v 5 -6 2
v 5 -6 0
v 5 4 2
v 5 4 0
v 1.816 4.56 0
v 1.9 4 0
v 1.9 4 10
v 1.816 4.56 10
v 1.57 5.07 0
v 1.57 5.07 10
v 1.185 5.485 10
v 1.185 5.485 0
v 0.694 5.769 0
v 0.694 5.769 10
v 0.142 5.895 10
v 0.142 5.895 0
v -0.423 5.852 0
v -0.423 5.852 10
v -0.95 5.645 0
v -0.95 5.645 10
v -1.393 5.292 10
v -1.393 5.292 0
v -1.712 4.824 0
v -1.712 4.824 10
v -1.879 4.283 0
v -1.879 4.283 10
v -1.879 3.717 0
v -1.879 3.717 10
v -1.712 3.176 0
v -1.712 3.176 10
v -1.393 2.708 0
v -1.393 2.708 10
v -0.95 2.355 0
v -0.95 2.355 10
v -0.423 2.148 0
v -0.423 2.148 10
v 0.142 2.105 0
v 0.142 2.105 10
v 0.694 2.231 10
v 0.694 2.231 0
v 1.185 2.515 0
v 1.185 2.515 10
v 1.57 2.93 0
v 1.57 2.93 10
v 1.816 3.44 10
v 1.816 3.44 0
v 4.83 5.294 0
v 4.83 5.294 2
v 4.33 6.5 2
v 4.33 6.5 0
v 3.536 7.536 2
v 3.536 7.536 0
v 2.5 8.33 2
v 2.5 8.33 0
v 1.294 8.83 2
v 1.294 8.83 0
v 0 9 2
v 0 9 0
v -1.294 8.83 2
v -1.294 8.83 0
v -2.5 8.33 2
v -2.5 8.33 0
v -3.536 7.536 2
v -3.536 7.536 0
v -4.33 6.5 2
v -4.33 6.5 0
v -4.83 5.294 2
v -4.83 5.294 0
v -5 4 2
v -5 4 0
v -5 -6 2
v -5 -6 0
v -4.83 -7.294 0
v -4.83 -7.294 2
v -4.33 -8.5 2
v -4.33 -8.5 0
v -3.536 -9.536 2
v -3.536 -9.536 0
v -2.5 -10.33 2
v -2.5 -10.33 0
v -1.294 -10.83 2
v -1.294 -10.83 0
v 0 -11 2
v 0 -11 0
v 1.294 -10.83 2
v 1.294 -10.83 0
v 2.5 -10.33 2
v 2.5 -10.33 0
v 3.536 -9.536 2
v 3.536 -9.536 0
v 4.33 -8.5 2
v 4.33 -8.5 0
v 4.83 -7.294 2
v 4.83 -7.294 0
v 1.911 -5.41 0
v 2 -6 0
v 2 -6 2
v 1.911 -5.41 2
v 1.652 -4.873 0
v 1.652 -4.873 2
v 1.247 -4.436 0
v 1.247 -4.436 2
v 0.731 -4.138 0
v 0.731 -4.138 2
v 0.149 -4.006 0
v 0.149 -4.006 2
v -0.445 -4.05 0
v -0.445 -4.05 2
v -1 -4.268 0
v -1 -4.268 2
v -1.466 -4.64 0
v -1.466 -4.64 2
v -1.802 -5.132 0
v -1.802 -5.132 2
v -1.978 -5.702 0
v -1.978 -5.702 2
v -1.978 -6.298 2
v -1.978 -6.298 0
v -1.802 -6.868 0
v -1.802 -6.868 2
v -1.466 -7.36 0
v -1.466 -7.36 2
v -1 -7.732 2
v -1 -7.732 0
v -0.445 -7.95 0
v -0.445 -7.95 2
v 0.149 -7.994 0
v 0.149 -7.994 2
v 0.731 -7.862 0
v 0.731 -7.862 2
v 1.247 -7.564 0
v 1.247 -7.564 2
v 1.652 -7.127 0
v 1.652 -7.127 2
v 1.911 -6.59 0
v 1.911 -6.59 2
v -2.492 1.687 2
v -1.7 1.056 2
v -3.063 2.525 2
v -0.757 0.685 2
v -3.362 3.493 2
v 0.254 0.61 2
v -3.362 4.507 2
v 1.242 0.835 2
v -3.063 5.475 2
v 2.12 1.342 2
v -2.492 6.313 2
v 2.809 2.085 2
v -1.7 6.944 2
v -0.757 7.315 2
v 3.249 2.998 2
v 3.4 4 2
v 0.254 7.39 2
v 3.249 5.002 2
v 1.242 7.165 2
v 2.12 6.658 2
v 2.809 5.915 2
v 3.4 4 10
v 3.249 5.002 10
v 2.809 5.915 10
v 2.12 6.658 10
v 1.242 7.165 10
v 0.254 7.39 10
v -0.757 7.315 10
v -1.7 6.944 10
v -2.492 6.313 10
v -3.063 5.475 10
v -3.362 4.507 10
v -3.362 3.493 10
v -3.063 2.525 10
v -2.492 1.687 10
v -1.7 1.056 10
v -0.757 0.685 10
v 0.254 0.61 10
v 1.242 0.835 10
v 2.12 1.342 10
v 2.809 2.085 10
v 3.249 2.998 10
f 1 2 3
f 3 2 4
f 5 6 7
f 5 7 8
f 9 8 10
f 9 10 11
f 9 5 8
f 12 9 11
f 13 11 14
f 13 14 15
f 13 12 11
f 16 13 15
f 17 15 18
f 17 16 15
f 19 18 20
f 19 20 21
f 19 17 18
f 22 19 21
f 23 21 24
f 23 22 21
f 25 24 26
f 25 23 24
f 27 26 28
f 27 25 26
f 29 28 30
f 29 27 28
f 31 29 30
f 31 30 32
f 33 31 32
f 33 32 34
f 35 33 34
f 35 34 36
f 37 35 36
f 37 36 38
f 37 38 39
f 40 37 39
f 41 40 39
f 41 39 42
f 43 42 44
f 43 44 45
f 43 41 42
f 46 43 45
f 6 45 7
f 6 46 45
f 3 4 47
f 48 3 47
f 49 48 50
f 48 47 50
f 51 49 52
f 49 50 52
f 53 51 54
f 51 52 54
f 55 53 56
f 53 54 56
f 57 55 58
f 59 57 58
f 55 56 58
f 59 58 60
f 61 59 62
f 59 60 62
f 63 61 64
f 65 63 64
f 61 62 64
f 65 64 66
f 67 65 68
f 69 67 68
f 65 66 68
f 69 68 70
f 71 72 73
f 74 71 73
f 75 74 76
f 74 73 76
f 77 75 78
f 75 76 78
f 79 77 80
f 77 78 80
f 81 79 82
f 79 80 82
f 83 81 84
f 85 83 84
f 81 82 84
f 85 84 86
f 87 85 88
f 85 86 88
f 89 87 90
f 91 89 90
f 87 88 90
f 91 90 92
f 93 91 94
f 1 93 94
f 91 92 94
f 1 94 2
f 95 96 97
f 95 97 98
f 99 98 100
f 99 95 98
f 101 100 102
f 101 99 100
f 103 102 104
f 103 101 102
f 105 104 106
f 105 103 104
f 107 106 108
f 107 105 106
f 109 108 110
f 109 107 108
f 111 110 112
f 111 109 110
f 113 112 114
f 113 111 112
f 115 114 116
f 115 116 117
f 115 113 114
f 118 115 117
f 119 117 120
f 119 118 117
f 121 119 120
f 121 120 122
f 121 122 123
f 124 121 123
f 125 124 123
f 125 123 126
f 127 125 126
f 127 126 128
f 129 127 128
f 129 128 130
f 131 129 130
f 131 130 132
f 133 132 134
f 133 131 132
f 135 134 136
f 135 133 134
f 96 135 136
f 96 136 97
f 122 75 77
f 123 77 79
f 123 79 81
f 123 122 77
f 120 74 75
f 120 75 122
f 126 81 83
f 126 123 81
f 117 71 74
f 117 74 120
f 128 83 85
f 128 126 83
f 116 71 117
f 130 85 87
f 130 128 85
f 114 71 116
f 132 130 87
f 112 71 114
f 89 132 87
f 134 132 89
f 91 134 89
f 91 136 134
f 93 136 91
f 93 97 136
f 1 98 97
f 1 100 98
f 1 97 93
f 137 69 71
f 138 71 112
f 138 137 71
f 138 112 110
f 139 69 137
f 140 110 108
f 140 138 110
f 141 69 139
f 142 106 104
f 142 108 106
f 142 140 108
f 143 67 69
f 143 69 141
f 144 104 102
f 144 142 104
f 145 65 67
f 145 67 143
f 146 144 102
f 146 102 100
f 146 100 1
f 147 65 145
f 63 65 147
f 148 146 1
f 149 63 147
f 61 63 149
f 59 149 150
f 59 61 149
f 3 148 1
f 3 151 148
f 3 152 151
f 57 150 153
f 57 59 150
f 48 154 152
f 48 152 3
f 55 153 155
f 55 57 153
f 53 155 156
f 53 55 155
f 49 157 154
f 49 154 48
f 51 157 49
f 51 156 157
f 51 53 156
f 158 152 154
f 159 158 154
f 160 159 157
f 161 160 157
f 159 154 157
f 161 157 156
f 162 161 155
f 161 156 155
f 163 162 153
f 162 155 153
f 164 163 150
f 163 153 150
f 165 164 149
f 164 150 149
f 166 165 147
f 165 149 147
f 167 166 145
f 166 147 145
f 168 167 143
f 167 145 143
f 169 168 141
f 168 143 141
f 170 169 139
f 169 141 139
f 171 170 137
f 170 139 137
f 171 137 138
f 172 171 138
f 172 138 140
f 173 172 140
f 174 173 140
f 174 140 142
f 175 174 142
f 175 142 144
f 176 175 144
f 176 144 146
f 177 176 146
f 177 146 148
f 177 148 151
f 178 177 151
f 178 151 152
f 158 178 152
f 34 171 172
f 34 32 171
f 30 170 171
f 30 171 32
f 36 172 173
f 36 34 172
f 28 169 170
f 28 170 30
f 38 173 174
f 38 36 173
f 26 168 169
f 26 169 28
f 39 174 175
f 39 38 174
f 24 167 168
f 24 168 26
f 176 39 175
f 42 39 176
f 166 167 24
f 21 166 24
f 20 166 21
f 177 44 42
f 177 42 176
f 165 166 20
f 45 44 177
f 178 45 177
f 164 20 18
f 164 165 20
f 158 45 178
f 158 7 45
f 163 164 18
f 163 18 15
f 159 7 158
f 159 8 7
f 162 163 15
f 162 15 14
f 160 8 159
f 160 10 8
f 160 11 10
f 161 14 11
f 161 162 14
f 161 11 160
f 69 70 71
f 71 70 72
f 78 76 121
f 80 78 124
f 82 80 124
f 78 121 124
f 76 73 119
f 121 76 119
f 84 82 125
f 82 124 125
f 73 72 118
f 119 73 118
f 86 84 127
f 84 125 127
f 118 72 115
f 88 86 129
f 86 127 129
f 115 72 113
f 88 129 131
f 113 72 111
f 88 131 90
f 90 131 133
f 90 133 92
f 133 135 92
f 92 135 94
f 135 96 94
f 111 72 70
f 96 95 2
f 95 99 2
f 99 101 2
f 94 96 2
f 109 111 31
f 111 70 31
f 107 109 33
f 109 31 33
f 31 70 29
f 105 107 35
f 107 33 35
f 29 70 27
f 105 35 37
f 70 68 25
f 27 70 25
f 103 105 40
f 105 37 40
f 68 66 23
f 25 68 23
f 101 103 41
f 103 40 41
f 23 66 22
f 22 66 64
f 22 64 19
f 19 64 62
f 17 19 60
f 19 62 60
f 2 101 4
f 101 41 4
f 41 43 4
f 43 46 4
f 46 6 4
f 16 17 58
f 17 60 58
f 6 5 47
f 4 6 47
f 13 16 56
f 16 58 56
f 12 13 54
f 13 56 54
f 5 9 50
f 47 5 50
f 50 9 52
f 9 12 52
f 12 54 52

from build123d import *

# Parameters (mm, degrees)
F0_R     = 3.4
F0_R_2   = 1.9
F1_DEPTH = 10
F0_R_3   = 2
F2_DEPTH = 2


with BuildPart() as f1:
    # F0 (on Top) → F1 (new body)
    with BuildSketch(Plane.XY):
        with Locations((0, 4)):
            Circle(F0_R)
        with Locations((0, 4)):
            Circle(F0_R_2, mode=Mode.SUBTRACT)
    extrude(amount=F1_DEPTH)

    # F0 (on Top) → F2 (join)
    with BuildSketch(Plane.XY):
        with BuildLine():
            ThreePointArc((-5, 4), (-3.535534, 0.464466), (0, -1))
            ThreePointArc((0, -1), (3.535534, 0.464466), (5, 4))
            ThreePointArc((5, 4), (0, 9), (-5, 4))
        make_face()
        with Locations((0, 4)):
            Circle(F0_R, mode=Mode.SUBTRACT)
        with BuildLine():
            ThreePointArc((0, -1), (3.535534, -2.464466), (5, -6))
            Line((5, -6), (5, 4))
            ThreePointArc((5, 4), (3.535534, 0.464466), (0, -1))
        make_face()
        with BuildLine():
            ThreePointArc((0, -1), (-3.535534, -2.464466), (-5, -6))
            ThreePointArc((-5, -6), (0, -11), (5, -6))
            ThreePointArc((5, -6), (3.535534, -2.464466), (0, -1))
        make_face()
        with Locations((0, -6)):
            Circle(F0_R_3, mode=Mode.SUBTRACT)
        with BuildLine():
            Line((-5, 4), (-5, -6))
            ThreePointArc((-5, -6), (-3.535534, -2.464466), (0, -1))
            ThreePointArc((0, -1), (-3.535534, 0.464466), (-5, 4))
        make_face()
    extrude(amount=F2_DEPTH)


solid = f1.part
